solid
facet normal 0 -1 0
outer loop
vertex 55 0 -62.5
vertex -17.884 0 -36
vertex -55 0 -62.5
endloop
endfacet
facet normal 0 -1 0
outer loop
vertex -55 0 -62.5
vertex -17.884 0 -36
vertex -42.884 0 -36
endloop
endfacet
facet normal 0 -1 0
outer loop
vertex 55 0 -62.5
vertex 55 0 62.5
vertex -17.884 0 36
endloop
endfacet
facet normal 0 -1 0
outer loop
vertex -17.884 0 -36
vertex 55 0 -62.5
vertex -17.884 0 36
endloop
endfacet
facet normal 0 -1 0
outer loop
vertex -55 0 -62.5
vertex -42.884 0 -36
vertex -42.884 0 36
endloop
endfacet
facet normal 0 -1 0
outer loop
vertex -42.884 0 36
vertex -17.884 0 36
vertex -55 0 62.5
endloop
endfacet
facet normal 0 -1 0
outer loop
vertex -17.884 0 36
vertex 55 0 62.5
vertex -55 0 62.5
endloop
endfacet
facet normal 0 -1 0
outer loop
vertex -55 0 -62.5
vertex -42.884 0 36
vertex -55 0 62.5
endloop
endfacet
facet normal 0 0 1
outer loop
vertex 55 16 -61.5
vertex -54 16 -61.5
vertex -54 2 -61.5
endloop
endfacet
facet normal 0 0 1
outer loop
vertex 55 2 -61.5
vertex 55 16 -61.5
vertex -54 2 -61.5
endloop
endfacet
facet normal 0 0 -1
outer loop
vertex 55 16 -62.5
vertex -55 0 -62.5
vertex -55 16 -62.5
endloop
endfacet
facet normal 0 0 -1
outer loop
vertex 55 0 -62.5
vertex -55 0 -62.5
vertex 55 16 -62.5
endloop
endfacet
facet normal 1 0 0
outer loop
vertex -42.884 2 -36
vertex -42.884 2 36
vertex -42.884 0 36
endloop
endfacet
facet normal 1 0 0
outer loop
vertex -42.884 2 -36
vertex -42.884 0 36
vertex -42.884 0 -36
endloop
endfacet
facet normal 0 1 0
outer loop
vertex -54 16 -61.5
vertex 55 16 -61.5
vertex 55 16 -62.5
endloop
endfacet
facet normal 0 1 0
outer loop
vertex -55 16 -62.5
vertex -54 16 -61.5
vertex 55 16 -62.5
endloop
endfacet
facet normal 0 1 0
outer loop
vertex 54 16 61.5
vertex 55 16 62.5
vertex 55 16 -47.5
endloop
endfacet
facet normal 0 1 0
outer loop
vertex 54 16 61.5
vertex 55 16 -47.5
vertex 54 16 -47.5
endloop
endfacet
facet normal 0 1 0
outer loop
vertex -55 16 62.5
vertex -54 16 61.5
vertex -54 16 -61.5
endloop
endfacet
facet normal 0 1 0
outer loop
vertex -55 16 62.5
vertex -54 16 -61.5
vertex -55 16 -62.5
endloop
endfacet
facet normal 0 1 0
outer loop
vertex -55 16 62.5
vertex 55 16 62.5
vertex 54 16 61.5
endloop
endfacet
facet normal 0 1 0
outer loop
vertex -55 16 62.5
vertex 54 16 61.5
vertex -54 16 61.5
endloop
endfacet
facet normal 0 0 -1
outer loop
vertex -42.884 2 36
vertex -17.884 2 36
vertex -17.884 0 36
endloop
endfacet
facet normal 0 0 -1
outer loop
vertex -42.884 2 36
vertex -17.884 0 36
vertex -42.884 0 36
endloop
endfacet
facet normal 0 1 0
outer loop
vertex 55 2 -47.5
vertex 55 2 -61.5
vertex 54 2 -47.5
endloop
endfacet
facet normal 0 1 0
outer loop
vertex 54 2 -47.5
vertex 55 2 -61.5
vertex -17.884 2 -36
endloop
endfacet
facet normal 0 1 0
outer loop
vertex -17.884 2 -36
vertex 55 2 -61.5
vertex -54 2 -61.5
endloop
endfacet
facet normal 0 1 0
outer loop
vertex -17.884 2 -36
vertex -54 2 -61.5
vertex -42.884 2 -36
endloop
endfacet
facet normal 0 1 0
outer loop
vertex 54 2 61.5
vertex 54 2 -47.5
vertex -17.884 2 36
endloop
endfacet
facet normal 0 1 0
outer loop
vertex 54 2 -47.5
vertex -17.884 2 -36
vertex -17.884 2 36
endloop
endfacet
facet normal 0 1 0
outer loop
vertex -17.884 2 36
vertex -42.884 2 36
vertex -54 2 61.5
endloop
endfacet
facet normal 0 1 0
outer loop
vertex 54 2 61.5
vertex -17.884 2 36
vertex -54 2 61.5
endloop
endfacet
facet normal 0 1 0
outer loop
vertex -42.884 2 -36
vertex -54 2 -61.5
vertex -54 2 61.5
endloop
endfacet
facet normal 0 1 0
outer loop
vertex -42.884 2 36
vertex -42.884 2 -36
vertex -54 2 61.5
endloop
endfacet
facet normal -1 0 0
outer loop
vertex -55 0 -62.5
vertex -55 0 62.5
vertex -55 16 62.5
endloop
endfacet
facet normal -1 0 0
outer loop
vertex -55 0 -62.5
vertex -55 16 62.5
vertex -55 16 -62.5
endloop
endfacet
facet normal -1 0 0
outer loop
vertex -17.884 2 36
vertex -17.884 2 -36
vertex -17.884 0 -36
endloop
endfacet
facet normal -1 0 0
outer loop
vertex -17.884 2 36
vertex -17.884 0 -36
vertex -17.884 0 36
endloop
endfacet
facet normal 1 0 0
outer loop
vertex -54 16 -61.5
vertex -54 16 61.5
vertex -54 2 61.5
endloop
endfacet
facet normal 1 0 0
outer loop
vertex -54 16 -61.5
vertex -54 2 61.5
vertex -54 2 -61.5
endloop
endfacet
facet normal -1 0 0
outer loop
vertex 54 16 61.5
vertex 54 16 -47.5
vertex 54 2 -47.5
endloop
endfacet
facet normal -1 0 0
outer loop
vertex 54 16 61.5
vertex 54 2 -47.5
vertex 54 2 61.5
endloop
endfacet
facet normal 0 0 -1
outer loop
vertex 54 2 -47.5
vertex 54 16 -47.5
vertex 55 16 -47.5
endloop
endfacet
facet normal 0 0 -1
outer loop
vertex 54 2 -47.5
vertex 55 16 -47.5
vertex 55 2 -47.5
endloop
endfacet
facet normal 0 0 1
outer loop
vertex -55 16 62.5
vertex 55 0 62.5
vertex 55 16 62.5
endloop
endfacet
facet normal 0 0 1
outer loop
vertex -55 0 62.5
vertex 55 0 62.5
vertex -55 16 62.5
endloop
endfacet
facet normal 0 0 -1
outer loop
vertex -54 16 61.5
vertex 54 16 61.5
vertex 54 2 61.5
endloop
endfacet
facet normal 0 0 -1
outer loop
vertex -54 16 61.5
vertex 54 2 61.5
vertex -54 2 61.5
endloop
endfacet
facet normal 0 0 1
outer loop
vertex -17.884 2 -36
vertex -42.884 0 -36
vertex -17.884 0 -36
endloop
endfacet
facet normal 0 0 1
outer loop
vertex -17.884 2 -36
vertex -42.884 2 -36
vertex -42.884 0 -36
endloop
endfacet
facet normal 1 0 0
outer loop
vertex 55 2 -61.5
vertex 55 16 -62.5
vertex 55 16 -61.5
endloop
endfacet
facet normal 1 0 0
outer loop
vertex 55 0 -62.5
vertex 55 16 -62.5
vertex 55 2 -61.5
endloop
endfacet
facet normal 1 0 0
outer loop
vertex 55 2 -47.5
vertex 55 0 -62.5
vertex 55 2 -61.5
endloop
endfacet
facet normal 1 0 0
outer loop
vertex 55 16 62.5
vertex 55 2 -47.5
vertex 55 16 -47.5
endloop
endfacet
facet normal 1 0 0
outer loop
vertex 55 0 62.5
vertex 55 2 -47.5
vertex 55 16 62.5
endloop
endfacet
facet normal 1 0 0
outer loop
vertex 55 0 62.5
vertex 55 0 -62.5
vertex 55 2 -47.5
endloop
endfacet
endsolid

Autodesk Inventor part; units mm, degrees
ref_plane "YZ Plane" through (0, 0, 0) normal (1, 0, 0) x (0, 1, 0)
ref_plane "XZ Plane" through (0, 0, 0) normal (0, 1, 0) x (-1, 0, 0)
ref_plane "XY Plane" through (0, 0, 0) normal (0, 0, 1) x (1, 0, 0)
sketch "Sketch1" plane through (0, 0, 0) normal (0, 1, 0) x (-1, 0, 0)
  line L0 (-55, 62.5) -> (55, 62.5)
  line L1 (55, 62.5) -> (55, -62.5)
  line L2 (55, -62.5) -> (-55, -62.5)
  line L3 (-55, -62.5) -> (-55, 62.5)
  line L4 (-55, 62.5) -> (55, -62.5) construction
  line L5 (55, 62.5) -> (-55, -62.5) construction
  point P0 (0, 0)
  dimension "d0" = 125
  dimension "d1" = 110
extrude "Extrusion1" add sketch "Sketch1" along normal blind 16
sketch "Sketch2" plane through (0, 16, 0) normal (0, 1, 0) x (1, 0, 0)
  line L0 (54, -61.5) -> (-54, -61.5)
  line L1 (-54, -61.5) -> (-54, 61.5)
  line L2 (-54, 61.5) -> (54, 61.5)
  line L3 (54, 61.5) -> (54, -61.5)
  line L4 (54, -61.5) -> (-54, 61.5) construction
  line L5 (-54, -61.5) -> (54, 61.5) construction
  point P0 (0, 0)
  dimension "d4" = 123
  dimension "d5" = 108
extrude "Extrusion2" cut sketch "Sketch2" against normal blind 14
sketch "Sketch3" plane through (0, 2, 0) normal (0, 1, 0) x (1, 0, 0)
  point P0 (0, 0)
sketch "Sketch4" plane through (0, 2, 0) normal (0, 1, 0) x (1, 0, 0)
  line L0 (-17.8843, -36) -> (-42.8843, -36)
  line L1 (-42.8843, -36) -> (-42.8843, 36)
  line L2 (-42.8843, 36) -> (-17.8843, 36)
  line L3 (-17.8843, 36) -> (-17.8843, -36)
  line L4 (-17.8843, -36) -> (-42.8843, 36) construction
  line L5 (-42.8843, -36) -> (-17.8843, 36) construction
  point P0 (0, 0)
  point P1 (-30.3843, 0)
  dimension "d8" = 72
  dimension "d9" = 25
extrude "Extrusion3" cut sketch "Sketch4" against normal blind 14
sketch "Sketch5" plane through (54, 16, -61.5) normal (-1, 0, 0) x (0, 0, 1)
  point P0 (61.5, -16)
sketch "Sketch6" plane through (54, 16, -61.5) normal (-1, 0, 0) x (0, 0, 1)
  line L0 (0, 0) -> (0, -14) projected
  line L1 (0, -14) -> (123, -14) projected
  line L2 (0, 0) -> (14, 0)
  line L3 (14, 0) -> (14, -14)
  line L4 (14, -14) -> (0, -14)
  line L5 (0, -14) -> (0, 0)
  point P0 (61.5, -16)
  dimension "d12" = 14
  dimension "d13" = 123
  dimension "d14" = 14
extrude "Extrusion4" cut sketch "Sketch6" against normal blind 14
properties part number "kotak_v2"
